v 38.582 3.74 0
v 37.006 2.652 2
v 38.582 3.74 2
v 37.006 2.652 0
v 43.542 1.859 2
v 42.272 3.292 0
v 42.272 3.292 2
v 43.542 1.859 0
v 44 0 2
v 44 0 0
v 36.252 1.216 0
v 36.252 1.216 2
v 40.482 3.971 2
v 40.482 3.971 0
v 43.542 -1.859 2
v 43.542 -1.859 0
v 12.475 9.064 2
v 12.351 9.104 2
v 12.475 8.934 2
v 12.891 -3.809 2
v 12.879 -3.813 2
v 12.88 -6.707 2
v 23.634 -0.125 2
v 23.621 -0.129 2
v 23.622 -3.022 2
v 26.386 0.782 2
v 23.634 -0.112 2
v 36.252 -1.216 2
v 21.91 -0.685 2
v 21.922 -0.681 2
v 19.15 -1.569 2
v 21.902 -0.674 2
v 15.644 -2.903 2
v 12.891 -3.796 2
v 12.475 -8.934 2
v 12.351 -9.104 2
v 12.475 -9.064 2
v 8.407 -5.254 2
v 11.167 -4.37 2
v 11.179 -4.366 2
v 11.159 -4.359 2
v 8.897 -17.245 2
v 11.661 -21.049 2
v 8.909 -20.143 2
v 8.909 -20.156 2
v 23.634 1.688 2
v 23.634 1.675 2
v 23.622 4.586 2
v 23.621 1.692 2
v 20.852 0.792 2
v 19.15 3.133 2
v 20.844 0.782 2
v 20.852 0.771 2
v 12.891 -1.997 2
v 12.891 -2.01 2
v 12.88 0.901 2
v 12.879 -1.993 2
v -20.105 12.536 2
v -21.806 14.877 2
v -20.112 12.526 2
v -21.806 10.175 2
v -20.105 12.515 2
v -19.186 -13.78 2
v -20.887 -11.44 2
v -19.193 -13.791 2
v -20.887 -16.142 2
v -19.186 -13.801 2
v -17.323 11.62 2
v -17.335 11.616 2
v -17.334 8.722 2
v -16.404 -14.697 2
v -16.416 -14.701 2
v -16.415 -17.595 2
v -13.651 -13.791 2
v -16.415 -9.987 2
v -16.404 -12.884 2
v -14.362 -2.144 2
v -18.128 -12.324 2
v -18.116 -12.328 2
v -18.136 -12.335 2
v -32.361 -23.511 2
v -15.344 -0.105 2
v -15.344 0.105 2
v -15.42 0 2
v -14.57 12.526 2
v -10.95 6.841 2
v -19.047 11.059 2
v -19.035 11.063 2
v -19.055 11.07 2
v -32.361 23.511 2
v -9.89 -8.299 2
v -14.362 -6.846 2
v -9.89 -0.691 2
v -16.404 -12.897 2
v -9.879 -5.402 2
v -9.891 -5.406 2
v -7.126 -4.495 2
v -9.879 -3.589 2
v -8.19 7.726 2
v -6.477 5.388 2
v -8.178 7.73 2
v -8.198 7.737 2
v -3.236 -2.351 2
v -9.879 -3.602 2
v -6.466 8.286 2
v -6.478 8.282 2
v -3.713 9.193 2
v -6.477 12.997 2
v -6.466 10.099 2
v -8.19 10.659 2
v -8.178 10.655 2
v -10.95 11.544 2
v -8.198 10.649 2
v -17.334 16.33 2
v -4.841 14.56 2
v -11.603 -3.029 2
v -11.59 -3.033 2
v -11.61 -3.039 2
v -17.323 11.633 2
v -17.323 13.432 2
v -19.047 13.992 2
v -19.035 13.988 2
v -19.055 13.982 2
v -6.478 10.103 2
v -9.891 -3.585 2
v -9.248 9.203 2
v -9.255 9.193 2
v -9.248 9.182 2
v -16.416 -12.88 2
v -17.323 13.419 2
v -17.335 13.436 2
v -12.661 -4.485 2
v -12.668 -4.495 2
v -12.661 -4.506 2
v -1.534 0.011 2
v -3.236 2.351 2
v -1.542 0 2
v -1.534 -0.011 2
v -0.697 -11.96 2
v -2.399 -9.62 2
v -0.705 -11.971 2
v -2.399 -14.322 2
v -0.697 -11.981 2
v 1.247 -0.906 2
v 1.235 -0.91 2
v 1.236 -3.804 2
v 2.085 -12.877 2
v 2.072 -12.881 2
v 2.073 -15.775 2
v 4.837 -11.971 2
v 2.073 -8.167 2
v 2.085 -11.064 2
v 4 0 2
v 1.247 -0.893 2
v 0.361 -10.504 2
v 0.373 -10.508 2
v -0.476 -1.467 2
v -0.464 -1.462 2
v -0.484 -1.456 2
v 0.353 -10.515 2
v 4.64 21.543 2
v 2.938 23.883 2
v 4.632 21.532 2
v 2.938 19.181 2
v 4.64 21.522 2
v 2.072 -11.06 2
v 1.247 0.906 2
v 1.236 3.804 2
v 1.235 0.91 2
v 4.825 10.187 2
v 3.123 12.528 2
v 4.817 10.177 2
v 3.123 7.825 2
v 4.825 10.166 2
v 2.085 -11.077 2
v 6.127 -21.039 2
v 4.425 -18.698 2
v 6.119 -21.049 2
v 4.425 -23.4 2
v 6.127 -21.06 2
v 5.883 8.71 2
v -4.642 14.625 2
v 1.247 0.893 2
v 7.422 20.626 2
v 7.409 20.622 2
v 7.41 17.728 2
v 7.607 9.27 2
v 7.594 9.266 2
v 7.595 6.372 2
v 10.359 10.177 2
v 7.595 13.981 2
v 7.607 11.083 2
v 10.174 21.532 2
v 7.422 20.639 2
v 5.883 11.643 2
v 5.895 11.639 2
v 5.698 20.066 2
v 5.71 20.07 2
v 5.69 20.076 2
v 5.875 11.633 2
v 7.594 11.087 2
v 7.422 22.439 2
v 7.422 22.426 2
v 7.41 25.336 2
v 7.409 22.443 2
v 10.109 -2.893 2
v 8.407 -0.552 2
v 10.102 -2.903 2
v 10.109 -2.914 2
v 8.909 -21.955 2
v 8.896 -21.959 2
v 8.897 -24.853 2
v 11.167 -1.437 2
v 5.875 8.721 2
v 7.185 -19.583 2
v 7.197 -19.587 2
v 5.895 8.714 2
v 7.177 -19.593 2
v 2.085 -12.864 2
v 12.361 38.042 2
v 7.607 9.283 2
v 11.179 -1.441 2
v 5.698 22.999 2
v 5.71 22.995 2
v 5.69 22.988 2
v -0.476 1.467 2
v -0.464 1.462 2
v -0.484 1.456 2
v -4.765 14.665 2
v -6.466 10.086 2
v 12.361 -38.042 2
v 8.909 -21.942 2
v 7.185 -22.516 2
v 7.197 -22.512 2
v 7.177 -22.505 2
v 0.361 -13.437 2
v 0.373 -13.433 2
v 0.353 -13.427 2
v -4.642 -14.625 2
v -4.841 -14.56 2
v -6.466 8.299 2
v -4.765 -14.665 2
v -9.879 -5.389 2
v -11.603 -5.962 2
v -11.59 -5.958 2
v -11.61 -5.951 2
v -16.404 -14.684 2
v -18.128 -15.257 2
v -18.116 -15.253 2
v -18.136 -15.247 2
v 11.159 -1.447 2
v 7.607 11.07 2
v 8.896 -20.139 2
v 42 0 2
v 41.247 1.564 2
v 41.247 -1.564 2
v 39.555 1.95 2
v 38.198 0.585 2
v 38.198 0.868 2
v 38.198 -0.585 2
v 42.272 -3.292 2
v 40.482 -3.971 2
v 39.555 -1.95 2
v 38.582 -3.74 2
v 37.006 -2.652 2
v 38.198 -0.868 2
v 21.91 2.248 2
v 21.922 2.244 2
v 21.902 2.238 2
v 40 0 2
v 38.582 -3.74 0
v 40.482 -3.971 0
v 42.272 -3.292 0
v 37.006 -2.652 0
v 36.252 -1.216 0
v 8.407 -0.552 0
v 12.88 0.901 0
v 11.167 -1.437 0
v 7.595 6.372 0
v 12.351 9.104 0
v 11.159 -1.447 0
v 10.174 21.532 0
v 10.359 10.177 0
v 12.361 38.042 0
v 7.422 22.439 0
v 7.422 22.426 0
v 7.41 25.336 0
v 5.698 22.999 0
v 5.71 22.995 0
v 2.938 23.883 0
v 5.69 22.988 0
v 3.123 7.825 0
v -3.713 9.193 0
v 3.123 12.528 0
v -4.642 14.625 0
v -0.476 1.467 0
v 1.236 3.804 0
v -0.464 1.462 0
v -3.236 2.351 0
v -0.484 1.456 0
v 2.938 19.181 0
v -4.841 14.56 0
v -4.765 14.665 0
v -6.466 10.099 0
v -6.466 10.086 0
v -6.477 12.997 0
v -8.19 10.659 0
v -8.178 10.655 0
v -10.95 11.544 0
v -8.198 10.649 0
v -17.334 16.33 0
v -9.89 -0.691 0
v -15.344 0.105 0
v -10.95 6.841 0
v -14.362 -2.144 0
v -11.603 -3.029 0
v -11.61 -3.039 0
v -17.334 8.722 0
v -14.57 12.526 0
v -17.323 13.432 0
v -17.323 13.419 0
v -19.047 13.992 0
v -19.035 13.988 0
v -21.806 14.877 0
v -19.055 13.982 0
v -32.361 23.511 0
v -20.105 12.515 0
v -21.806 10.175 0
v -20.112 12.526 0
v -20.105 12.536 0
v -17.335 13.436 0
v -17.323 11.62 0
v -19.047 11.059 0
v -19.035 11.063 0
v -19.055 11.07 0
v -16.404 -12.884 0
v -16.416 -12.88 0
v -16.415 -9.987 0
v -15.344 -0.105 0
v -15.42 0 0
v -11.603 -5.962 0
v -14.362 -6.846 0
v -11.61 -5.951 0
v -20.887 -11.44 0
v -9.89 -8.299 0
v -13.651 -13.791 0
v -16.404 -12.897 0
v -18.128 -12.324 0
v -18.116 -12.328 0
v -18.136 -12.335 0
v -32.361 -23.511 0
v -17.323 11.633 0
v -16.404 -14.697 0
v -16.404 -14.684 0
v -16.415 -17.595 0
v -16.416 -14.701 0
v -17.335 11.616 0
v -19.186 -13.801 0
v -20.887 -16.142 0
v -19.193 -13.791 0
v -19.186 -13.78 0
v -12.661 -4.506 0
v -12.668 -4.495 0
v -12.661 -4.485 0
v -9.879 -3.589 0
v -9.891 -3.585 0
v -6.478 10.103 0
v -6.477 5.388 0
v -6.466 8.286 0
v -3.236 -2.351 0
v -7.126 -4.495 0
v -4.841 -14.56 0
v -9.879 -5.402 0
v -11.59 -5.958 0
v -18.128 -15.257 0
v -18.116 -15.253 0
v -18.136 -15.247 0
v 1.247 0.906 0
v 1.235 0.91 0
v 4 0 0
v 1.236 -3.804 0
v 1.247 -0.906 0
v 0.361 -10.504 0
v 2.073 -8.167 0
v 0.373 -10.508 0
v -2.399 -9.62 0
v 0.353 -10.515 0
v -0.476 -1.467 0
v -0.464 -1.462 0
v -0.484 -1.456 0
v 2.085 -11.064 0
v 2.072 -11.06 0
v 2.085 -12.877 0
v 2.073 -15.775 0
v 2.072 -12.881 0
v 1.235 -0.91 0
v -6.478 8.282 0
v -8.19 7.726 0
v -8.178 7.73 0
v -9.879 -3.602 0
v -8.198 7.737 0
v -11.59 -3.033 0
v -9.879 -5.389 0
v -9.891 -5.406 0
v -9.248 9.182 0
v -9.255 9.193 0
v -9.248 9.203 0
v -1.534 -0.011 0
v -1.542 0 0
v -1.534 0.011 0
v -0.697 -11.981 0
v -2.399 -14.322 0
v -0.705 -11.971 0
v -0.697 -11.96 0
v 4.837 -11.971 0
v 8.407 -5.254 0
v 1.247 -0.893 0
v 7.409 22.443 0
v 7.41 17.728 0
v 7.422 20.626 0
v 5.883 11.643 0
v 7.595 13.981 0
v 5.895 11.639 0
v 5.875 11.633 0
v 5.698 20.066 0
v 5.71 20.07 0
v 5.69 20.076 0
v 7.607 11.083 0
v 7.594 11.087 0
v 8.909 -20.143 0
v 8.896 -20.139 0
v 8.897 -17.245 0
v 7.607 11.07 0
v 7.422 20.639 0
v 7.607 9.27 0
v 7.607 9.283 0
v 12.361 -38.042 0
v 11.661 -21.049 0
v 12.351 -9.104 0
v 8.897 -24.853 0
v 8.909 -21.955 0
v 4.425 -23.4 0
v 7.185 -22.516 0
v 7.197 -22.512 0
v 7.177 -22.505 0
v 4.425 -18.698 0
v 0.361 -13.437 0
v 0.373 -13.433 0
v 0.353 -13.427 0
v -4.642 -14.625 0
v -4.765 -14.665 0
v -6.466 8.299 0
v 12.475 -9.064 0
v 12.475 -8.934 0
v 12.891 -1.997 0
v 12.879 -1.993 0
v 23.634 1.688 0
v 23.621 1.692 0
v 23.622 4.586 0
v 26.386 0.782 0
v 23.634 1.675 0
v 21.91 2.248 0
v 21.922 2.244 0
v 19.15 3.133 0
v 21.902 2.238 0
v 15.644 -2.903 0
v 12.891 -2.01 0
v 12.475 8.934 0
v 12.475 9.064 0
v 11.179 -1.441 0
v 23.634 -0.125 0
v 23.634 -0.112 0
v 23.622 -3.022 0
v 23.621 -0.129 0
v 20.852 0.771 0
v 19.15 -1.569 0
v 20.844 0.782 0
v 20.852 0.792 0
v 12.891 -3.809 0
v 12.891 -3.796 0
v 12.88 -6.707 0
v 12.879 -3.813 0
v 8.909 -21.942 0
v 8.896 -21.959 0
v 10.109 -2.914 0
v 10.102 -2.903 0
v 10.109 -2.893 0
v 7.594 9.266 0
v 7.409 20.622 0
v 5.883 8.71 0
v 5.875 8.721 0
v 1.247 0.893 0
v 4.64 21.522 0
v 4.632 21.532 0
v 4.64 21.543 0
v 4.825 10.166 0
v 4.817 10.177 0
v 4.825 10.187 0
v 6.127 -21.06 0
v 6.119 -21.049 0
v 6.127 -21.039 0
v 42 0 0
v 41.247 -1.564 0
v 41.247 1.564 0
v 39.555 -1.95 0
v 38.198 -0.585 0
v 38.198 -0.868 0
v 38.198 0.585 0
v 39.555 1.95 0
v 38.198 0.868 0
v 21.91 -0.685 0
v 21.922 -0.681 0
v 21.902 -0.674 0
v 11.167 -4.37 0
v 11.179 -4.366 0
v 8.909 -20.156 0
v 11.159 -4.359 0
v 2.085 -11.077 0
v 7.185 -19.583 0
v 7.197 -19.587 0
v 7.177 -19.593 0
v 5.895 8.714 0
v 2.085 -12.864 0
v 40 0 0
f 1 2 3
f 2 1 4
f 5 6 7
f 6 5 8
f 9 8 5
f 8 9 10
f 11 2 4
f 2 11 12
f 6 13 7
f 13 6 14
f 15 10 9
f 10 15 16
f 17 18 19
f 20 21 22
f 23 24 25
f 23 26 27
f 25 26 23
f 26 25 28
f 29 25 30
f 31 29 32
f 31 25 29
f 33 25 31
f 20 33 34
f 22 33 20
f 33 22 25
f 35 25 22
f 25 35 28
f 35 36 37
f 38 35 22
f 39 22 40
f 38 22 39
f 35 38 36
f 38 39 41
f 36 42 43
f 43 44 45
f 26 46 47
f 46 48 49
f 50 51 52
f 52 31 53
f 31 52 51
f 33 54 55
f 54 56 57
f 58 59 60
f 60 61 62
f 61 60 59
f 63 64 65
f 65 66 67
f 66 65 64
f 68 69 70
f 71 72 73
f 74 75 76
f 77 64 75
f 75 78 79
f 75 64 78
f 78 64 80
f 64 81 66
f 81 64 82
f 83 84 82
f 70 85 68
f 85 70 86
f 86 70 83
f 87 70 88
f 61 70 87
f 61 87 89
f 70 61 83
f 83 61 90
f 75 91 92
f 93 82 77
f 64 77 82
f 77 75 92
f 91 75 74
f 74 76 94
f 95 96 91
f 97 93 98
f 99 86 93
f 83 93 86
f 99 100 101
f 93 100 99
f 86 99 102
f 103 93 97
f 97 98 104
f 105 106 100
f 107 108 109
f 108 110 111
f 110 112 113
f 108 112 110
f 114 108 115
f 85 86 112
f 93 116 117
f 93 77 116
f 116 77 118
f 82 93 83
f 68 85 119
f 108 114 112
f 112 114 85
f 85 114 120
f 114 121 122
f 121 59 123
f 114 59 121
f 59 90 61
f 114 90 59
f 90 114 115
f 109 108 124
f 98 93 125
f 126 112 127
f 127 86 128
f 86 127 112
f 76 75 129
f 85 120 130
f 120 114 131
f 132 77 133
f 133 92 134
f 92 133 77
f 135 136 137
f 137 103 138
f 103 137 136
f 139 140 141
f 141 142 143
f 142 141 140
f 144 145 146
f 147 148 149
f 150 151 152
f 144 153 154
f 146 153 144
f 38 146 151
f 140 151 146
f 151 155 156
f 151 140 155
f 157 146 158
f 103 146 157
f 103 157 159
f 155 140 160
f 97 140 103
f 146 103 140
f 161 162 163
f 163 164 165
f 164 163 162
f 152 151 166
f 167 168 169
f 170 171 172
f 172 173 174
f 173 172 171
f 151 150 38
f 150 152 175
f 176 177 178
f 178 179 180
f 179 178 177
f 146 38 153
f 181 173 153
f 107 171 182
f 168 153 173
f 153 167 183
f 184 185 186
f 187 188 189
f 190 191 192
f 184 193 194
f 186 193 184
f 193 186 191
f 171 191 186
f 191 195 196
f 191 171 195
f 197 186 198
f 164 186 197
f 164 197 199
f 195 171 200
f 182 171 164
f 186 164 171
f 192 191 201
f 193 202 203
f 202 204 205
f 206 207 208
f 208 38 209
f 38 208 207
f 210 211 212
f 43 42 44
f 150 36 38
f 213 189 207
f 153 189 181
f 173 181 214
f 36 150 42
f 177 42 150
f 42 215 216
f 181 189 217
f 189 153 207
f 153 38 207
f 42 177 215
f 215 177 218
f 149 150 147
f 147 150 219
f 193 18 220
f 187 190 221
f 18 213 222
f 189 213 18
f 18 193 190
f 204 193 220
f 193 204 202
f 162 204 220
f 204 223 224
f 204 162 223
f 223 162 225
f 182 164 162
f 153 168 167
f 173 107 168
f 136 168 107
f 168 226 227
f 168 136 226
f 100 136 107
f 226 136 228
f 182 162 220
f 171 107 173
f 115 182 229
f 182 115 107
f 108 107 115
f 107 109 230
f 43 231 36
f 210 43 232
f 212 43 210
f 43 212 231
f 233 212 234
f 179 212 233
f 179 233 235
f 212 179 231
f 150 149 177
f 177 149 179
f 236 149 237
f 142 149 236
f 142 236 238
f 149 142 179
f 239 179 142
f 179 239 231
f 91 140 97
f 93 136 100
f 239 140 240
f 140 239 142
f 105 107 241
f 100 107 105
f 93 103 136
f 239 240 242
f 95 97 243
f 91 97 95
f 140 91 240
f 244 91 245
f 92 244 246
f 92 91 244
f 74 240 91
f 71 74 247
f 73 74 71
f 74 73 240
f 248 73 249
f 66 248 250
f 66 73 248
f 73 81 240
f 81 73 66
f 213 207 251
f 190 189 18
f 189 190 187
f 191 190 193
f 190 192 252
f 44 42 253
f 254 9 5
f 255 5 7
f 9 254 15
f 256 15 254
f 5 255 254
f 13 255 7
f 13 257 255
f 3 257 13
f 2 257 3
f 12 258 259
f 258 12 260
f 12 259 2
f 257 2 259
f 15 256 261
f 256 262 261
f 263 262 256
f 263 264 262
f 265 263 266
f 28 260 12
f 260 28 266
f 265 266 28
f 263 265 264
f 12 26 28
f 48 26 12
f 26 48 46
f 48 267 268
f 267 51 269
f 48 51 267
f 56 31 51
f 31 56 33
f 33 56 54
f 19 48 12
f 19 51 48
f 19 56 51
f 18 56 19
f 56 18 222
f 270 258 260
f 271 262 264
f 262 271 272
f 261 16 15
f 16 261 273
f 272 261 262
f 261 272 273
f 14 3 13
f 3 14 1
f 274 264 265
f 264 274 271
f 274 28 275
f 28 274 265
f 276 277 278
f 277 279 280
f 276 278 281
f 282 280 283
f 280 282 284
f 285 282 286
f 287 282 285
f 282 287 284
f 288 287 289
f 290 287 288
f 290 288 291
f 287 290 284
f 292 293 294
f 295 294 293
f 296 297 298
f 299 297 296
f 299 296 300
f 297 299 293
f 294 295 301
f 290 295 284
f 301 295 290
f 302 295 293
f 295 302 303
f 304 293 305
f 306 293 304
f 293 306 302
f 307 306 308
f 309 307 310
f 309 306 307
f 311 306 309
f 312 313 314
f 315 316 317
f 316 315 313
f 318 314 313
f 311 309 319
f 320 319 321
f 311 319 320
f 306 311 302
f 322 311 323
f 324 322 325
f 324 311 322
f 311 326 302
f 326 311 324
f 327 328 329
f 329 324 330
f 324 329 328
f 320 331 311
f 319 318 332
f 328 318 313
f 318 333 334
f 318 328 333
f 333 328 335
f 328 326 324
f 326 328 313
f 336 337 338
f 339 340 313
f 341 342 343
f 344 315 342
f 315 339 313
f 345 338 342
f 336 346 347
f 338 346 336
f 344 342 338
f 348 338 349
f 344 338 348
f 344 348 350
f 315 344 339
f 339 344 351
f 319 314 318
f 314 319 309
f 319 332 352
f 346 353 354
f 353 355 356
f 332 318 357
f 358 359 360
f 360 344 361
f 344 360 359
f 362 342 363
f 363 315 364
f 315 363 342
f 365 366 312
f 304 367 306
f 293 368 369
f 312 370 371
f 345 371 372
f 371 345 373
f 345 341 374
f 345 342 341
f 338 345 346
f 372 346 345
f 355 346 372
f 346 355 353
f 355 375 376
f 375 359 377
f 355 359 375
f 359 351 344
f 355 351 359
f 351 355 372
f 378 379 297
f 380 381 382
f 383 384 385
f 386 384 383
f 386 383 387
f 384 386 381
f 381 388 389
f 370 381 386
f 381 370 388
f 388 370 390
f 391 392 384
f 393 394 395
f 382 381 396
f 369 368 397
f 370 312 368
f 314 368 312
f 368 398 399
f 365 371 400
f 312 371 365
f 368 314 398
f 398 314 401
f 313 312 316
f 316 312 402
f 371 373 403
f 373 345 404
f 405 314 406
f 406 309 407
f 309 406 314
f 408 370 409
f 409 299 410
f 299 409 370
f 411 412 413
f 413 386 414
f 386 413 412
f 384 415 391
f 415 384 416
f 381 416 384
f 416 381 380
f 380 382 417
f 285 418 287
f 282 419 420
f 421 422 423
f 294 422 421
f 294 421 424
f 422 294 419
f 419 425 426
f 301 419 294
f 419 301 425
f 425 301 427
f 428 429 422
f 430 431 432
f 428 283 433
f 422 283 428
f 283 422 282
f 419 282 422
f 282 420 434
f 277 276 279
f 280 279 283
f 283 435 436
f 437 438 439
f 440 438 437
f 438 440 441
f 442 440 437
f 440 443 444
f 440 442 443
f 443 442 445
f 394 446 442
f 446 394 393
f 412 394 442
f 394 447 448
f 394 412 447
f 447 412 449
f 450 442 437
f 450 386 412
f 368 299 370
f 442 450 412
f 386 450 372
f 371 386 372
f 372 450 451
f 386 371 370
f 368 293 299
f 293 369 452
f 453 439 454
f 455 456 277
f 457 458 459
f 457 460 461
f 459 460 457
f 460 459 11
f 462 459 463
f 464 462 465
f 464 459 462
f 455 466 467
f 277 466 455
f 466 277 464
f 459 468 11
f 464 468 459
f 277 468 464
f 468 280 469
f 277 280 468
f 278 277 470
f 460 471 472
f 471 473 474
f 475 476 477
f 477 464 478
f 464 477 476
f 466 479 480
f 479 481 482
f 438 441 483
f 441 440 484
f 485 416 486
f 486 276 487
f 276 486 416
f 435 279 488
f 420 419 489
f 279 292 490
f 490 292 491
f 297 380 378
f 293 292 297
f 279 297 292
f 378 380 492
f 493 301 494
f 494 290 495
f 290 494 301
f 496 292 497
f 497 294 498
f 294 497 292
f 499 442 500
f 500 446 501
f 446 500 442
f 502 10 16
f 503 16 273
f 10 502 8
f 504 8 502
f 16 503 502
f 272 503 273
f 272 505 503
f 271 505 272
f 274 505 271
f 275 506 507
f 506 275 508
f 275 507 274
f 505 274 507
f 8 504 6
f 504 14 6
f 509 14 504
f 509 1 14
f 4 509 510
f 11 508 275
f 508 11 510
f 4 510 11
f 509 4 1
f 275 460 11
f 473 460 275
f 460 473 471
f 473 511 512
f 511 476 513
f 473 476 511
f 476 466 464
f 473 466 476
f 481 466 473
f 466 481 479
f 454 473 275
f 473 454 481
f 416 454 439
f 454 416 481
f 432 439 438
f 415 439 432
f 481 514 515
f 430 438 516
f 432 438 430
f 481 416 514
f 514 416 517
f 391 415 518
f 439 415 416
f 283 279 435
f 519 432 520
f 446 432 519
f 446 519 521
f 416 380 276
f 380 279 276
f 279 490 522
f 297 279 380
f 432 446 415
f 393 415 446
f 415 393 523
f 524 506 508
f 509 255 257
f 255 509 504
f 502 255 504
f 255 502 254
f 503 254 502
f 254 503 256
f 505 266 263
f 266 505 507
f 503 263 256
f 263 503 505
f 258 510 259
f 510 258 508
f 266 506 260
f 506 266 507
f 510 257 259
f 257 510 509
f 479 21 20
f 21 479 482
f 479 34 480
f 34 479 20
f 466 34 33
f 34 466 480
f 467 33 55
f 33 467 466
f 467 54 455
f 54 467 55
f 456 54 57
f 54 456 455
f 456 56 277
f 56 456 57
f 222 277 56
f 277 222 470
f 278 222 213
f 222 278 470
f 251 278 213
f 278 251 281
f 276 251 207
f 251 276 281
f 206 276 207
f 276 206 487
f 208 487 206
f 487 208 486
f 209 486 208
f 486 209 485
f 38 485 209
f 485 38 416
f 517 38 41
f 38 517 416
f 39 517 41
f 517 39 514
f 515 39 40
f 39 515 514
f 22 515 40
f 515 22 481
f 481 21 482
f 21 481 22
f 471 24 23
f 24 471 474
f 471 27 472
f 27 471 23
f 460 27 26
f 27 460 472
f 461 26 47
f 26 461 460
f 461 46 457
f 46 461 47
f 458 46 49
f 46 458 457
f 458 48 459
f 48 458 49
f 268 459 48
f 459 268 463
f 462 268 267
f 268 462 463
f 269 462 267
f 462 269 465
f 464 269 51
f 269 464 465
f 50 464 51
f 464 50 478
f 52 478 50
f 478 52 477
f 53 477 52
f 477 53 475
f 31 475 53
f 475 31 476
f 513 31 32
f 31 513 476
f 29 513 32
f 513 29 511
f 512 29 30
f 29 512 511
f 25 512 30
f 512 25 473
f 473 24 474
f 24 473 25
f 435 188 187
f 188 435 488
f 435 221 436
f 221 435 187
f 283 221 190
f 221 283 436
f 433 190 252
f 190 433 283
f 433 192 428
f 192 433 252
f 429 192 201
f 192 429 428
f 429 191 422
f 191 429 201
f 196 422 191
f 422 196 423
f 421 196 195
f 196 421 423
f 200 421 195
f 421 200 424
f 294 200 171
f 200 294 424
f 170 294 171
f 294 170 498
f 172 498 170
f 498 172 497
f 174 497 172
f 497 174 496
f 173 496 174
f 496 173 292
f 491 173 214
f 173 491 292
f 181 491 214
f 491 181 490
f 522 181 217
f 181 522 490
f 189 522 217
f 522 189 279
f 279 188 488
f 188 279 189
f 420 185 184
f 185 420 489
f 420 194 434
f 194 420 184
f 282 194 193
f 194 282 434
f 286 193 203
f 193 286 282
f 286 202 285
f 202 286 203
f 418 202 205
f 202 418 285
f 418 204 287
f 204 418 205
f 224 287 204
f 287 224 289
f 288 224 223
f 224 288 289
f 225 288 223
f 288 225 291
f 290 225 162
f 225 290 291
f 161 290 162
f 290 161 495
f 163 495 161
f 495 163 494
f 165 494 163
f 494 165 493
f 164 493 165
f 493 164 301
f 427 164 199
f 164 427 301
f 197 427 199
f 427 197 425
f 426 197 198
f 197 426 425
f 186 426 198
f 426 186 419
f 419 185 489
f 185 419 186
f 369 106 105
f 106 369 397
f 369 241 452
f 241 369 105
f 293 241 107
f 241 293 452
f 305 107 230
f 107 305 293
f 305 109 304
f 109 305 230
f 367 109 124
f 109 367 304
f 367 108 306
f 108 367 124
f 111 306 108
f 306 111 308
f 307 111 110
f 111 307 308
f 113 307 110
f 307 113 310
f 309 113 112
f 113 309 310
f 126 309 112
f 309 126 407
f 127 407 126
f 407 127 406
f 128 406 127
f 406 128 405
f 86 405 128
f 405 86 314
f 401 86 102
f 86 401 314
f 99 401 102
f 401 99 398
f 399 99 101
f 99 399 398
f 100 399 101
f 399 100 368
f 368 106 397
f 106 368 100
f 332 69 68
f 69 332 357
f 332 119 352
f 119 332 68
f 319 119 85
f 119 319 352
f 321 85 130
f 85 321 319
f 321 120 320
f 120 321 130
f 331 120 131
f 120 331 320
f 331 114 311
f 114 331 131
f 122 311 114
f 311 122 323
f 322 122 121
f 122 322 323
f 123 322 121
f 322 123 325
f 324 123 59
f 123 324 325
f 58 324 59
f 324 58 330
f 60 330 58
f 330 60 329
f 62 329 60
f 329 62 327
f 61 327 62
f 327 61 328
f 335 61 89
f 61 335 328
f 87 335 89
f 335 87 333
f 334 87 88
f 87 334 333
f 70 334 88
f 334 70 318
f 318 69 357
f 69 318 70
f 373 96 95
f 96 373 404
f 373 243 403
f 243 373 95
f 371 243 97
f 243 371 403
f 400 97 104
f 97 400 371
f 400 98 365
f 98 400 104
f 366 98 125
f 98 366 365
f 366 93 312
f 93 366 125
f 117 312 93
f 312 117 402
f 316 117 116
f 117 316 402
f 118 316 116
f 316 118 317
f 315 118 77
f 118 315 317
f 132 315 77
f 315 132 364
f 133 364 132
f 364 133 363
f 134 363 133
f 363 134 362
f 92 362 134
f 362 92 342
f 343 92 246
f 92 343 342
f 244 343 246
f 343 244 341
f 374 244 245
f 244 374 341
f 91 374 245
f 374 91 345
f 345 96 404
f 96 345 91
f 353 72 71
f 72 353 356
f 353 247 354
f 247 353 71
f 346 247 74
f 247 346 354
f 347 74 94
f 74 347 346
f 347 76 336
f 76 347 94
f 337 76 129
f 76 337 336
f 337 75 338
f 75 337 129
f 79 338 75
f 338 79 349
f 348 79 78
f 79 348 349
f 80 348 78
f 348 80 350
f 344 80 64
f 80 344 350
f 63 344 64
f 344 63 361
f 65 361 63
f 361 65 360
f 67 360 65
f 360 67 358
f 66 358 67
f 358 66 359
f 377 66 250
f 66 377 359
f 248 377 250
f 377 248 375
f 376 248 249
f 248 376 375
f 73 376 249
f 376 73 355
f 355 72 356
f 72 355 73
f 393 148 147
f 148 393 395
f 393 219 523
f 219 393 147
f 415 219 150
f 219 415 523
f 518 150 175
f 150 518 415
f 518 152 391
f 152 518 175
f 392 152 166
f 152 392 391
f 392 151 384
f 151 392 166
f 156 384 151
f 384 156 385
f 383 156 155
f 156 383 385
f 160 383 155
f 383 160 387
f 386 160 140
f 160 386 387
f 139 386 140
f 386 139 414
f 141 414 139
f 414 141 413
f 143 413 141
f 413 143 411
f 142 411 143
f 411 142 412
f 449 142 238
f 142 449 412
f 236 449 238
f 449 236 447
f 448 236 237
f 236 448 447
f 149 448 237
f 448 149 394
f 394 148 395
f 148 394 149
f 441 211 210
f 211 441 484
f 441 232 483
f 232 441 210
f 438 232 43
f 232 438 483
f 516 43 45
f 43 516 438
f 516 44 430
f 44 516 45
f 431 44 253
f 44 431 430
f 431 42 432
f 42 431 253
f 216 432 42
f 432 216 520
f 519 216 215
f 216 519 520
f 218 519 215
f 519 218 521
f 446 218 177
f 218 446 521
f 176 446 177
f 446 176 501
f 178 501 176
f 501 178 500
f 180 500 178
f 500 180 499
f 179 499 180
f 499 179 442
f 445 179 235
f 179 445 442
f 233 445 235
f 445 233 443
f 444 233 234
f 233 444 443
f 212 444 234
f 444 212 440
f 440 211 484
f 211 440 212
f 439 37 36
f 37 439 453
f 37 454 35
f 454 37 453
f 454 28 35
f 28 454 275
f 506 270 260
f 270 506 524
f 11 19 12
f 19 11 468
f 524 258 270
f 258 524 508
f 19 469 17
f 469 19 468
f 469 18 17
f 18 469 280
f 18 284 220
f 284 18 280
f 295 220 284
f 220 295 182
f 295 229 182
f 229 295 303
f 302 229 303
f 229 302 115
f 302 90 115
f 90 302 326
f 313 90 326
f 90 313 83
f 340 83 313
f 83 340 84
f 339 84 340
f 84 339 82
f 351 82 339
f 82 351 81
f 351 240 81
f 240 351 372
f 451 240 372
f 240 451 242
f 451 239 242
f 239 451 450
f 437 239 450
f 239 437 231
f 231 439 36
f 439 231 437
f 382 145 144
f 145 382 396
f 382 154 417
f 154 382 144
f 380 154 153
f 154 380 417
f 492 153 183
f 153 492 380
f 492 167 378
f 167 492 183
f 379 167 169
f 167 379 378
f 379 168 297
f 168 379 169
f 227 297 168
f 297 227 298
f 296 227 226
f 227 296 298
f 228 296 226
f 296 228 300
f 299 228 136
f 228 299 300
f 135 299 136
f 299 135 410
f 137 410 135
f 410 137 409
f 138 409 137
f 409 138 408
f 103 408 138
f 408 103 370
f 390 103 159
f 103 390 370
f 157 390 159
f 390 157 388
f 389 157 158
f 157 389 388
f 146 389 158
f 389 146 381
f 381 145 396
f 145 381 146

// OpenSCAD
// radius of the large star
radius=40;
// radius of the small stars
little=4;
//thickness
thick=2;
//-- Based on Parametric star(c)  2010 Juan Gonzalez-Gomez (Obijuan) juan@iearobotics.com
//-- GPL license

//-- The 2*N points of an N-ponted star are calculated as follows:
//-- There are two circunferences:  the inner and outer.  Outer points are located
//-- at angles: 0, 360/N, 360*2/N and on the outer circunference
//-- The inner points have the same angular distance but they are 360/(2*N) rotated
//-- respect to the outers. They are located on the inner circunference

//--- INPUT PARAMETERS:
//--- N: Number of points
//--  h: Height
//-- ri: Inner radius
//-- ro: outer radius
module parametric_star(N=5, h=2, ri=15, re=30) {

  //-- Calculate and draw a 2D tip of the star
 //-- INPUT: 
 //-- n: Number of the tip (from 0 to N-1)
  module tipstar(n) {
     i1 =  [ri*cos(-360*n/N+360/(N*2)), ri*sin(-360*n/N+360/(N*2))];
    e1 = [re*cos(-360*n/N), re*sin(-360*n/N)];
    i2 = [ri*cos(-360*(n+1)/N+360/(N*2)), ri*sin(-360*(n+1)/N+360/(N*2))];
    polygon([ i1, e1, i2]);
  }

  //-- Draw the 2D star and extrude
  
   //-- The star is the union of N 2D tips. 
   //-- A inner cylinder is also needed for filling
   //-- A flat (2D) star is built. The it is extruded
    linear_extrude(height=h) 
    union() {
      for (i=[0:N-1]) {
         tipstar(i);
      }
      rotate([0,0,360/(2*N)]) circle(r=ri+ri*0.01,$fn=N);
    }
}

radius=40;
little=4;
union(){
difference(){
translate([radius,0,0]) cylinder(thick,4,4);
translate([radius,0,0]) cylinder(thick,2,2);
}
difference(){
	parametric_star(N=5,h=thick, ri=radius/2.62,re=radius);
	parametric_star(N=5,h=thick, ri=little/2.62,re=little);
		for (j=[0:4]){
	//	x1= outer*cos(j*72-14)
	//	y1=outer*sin(j*72-14)
	translate([0.3*radius*cos(j*72-14),0.3*radius*sin(j*72-14),0]) parametric_star(N=5,h=thick, ri=little/2.62,re=little);
	translate([0.56*radius*cos(j*72+2),0.56*radius*sin(j*72+2),0]) parametric_star(N=5,h=thick, ri=little/2.62,re=little);
	}
}
}
